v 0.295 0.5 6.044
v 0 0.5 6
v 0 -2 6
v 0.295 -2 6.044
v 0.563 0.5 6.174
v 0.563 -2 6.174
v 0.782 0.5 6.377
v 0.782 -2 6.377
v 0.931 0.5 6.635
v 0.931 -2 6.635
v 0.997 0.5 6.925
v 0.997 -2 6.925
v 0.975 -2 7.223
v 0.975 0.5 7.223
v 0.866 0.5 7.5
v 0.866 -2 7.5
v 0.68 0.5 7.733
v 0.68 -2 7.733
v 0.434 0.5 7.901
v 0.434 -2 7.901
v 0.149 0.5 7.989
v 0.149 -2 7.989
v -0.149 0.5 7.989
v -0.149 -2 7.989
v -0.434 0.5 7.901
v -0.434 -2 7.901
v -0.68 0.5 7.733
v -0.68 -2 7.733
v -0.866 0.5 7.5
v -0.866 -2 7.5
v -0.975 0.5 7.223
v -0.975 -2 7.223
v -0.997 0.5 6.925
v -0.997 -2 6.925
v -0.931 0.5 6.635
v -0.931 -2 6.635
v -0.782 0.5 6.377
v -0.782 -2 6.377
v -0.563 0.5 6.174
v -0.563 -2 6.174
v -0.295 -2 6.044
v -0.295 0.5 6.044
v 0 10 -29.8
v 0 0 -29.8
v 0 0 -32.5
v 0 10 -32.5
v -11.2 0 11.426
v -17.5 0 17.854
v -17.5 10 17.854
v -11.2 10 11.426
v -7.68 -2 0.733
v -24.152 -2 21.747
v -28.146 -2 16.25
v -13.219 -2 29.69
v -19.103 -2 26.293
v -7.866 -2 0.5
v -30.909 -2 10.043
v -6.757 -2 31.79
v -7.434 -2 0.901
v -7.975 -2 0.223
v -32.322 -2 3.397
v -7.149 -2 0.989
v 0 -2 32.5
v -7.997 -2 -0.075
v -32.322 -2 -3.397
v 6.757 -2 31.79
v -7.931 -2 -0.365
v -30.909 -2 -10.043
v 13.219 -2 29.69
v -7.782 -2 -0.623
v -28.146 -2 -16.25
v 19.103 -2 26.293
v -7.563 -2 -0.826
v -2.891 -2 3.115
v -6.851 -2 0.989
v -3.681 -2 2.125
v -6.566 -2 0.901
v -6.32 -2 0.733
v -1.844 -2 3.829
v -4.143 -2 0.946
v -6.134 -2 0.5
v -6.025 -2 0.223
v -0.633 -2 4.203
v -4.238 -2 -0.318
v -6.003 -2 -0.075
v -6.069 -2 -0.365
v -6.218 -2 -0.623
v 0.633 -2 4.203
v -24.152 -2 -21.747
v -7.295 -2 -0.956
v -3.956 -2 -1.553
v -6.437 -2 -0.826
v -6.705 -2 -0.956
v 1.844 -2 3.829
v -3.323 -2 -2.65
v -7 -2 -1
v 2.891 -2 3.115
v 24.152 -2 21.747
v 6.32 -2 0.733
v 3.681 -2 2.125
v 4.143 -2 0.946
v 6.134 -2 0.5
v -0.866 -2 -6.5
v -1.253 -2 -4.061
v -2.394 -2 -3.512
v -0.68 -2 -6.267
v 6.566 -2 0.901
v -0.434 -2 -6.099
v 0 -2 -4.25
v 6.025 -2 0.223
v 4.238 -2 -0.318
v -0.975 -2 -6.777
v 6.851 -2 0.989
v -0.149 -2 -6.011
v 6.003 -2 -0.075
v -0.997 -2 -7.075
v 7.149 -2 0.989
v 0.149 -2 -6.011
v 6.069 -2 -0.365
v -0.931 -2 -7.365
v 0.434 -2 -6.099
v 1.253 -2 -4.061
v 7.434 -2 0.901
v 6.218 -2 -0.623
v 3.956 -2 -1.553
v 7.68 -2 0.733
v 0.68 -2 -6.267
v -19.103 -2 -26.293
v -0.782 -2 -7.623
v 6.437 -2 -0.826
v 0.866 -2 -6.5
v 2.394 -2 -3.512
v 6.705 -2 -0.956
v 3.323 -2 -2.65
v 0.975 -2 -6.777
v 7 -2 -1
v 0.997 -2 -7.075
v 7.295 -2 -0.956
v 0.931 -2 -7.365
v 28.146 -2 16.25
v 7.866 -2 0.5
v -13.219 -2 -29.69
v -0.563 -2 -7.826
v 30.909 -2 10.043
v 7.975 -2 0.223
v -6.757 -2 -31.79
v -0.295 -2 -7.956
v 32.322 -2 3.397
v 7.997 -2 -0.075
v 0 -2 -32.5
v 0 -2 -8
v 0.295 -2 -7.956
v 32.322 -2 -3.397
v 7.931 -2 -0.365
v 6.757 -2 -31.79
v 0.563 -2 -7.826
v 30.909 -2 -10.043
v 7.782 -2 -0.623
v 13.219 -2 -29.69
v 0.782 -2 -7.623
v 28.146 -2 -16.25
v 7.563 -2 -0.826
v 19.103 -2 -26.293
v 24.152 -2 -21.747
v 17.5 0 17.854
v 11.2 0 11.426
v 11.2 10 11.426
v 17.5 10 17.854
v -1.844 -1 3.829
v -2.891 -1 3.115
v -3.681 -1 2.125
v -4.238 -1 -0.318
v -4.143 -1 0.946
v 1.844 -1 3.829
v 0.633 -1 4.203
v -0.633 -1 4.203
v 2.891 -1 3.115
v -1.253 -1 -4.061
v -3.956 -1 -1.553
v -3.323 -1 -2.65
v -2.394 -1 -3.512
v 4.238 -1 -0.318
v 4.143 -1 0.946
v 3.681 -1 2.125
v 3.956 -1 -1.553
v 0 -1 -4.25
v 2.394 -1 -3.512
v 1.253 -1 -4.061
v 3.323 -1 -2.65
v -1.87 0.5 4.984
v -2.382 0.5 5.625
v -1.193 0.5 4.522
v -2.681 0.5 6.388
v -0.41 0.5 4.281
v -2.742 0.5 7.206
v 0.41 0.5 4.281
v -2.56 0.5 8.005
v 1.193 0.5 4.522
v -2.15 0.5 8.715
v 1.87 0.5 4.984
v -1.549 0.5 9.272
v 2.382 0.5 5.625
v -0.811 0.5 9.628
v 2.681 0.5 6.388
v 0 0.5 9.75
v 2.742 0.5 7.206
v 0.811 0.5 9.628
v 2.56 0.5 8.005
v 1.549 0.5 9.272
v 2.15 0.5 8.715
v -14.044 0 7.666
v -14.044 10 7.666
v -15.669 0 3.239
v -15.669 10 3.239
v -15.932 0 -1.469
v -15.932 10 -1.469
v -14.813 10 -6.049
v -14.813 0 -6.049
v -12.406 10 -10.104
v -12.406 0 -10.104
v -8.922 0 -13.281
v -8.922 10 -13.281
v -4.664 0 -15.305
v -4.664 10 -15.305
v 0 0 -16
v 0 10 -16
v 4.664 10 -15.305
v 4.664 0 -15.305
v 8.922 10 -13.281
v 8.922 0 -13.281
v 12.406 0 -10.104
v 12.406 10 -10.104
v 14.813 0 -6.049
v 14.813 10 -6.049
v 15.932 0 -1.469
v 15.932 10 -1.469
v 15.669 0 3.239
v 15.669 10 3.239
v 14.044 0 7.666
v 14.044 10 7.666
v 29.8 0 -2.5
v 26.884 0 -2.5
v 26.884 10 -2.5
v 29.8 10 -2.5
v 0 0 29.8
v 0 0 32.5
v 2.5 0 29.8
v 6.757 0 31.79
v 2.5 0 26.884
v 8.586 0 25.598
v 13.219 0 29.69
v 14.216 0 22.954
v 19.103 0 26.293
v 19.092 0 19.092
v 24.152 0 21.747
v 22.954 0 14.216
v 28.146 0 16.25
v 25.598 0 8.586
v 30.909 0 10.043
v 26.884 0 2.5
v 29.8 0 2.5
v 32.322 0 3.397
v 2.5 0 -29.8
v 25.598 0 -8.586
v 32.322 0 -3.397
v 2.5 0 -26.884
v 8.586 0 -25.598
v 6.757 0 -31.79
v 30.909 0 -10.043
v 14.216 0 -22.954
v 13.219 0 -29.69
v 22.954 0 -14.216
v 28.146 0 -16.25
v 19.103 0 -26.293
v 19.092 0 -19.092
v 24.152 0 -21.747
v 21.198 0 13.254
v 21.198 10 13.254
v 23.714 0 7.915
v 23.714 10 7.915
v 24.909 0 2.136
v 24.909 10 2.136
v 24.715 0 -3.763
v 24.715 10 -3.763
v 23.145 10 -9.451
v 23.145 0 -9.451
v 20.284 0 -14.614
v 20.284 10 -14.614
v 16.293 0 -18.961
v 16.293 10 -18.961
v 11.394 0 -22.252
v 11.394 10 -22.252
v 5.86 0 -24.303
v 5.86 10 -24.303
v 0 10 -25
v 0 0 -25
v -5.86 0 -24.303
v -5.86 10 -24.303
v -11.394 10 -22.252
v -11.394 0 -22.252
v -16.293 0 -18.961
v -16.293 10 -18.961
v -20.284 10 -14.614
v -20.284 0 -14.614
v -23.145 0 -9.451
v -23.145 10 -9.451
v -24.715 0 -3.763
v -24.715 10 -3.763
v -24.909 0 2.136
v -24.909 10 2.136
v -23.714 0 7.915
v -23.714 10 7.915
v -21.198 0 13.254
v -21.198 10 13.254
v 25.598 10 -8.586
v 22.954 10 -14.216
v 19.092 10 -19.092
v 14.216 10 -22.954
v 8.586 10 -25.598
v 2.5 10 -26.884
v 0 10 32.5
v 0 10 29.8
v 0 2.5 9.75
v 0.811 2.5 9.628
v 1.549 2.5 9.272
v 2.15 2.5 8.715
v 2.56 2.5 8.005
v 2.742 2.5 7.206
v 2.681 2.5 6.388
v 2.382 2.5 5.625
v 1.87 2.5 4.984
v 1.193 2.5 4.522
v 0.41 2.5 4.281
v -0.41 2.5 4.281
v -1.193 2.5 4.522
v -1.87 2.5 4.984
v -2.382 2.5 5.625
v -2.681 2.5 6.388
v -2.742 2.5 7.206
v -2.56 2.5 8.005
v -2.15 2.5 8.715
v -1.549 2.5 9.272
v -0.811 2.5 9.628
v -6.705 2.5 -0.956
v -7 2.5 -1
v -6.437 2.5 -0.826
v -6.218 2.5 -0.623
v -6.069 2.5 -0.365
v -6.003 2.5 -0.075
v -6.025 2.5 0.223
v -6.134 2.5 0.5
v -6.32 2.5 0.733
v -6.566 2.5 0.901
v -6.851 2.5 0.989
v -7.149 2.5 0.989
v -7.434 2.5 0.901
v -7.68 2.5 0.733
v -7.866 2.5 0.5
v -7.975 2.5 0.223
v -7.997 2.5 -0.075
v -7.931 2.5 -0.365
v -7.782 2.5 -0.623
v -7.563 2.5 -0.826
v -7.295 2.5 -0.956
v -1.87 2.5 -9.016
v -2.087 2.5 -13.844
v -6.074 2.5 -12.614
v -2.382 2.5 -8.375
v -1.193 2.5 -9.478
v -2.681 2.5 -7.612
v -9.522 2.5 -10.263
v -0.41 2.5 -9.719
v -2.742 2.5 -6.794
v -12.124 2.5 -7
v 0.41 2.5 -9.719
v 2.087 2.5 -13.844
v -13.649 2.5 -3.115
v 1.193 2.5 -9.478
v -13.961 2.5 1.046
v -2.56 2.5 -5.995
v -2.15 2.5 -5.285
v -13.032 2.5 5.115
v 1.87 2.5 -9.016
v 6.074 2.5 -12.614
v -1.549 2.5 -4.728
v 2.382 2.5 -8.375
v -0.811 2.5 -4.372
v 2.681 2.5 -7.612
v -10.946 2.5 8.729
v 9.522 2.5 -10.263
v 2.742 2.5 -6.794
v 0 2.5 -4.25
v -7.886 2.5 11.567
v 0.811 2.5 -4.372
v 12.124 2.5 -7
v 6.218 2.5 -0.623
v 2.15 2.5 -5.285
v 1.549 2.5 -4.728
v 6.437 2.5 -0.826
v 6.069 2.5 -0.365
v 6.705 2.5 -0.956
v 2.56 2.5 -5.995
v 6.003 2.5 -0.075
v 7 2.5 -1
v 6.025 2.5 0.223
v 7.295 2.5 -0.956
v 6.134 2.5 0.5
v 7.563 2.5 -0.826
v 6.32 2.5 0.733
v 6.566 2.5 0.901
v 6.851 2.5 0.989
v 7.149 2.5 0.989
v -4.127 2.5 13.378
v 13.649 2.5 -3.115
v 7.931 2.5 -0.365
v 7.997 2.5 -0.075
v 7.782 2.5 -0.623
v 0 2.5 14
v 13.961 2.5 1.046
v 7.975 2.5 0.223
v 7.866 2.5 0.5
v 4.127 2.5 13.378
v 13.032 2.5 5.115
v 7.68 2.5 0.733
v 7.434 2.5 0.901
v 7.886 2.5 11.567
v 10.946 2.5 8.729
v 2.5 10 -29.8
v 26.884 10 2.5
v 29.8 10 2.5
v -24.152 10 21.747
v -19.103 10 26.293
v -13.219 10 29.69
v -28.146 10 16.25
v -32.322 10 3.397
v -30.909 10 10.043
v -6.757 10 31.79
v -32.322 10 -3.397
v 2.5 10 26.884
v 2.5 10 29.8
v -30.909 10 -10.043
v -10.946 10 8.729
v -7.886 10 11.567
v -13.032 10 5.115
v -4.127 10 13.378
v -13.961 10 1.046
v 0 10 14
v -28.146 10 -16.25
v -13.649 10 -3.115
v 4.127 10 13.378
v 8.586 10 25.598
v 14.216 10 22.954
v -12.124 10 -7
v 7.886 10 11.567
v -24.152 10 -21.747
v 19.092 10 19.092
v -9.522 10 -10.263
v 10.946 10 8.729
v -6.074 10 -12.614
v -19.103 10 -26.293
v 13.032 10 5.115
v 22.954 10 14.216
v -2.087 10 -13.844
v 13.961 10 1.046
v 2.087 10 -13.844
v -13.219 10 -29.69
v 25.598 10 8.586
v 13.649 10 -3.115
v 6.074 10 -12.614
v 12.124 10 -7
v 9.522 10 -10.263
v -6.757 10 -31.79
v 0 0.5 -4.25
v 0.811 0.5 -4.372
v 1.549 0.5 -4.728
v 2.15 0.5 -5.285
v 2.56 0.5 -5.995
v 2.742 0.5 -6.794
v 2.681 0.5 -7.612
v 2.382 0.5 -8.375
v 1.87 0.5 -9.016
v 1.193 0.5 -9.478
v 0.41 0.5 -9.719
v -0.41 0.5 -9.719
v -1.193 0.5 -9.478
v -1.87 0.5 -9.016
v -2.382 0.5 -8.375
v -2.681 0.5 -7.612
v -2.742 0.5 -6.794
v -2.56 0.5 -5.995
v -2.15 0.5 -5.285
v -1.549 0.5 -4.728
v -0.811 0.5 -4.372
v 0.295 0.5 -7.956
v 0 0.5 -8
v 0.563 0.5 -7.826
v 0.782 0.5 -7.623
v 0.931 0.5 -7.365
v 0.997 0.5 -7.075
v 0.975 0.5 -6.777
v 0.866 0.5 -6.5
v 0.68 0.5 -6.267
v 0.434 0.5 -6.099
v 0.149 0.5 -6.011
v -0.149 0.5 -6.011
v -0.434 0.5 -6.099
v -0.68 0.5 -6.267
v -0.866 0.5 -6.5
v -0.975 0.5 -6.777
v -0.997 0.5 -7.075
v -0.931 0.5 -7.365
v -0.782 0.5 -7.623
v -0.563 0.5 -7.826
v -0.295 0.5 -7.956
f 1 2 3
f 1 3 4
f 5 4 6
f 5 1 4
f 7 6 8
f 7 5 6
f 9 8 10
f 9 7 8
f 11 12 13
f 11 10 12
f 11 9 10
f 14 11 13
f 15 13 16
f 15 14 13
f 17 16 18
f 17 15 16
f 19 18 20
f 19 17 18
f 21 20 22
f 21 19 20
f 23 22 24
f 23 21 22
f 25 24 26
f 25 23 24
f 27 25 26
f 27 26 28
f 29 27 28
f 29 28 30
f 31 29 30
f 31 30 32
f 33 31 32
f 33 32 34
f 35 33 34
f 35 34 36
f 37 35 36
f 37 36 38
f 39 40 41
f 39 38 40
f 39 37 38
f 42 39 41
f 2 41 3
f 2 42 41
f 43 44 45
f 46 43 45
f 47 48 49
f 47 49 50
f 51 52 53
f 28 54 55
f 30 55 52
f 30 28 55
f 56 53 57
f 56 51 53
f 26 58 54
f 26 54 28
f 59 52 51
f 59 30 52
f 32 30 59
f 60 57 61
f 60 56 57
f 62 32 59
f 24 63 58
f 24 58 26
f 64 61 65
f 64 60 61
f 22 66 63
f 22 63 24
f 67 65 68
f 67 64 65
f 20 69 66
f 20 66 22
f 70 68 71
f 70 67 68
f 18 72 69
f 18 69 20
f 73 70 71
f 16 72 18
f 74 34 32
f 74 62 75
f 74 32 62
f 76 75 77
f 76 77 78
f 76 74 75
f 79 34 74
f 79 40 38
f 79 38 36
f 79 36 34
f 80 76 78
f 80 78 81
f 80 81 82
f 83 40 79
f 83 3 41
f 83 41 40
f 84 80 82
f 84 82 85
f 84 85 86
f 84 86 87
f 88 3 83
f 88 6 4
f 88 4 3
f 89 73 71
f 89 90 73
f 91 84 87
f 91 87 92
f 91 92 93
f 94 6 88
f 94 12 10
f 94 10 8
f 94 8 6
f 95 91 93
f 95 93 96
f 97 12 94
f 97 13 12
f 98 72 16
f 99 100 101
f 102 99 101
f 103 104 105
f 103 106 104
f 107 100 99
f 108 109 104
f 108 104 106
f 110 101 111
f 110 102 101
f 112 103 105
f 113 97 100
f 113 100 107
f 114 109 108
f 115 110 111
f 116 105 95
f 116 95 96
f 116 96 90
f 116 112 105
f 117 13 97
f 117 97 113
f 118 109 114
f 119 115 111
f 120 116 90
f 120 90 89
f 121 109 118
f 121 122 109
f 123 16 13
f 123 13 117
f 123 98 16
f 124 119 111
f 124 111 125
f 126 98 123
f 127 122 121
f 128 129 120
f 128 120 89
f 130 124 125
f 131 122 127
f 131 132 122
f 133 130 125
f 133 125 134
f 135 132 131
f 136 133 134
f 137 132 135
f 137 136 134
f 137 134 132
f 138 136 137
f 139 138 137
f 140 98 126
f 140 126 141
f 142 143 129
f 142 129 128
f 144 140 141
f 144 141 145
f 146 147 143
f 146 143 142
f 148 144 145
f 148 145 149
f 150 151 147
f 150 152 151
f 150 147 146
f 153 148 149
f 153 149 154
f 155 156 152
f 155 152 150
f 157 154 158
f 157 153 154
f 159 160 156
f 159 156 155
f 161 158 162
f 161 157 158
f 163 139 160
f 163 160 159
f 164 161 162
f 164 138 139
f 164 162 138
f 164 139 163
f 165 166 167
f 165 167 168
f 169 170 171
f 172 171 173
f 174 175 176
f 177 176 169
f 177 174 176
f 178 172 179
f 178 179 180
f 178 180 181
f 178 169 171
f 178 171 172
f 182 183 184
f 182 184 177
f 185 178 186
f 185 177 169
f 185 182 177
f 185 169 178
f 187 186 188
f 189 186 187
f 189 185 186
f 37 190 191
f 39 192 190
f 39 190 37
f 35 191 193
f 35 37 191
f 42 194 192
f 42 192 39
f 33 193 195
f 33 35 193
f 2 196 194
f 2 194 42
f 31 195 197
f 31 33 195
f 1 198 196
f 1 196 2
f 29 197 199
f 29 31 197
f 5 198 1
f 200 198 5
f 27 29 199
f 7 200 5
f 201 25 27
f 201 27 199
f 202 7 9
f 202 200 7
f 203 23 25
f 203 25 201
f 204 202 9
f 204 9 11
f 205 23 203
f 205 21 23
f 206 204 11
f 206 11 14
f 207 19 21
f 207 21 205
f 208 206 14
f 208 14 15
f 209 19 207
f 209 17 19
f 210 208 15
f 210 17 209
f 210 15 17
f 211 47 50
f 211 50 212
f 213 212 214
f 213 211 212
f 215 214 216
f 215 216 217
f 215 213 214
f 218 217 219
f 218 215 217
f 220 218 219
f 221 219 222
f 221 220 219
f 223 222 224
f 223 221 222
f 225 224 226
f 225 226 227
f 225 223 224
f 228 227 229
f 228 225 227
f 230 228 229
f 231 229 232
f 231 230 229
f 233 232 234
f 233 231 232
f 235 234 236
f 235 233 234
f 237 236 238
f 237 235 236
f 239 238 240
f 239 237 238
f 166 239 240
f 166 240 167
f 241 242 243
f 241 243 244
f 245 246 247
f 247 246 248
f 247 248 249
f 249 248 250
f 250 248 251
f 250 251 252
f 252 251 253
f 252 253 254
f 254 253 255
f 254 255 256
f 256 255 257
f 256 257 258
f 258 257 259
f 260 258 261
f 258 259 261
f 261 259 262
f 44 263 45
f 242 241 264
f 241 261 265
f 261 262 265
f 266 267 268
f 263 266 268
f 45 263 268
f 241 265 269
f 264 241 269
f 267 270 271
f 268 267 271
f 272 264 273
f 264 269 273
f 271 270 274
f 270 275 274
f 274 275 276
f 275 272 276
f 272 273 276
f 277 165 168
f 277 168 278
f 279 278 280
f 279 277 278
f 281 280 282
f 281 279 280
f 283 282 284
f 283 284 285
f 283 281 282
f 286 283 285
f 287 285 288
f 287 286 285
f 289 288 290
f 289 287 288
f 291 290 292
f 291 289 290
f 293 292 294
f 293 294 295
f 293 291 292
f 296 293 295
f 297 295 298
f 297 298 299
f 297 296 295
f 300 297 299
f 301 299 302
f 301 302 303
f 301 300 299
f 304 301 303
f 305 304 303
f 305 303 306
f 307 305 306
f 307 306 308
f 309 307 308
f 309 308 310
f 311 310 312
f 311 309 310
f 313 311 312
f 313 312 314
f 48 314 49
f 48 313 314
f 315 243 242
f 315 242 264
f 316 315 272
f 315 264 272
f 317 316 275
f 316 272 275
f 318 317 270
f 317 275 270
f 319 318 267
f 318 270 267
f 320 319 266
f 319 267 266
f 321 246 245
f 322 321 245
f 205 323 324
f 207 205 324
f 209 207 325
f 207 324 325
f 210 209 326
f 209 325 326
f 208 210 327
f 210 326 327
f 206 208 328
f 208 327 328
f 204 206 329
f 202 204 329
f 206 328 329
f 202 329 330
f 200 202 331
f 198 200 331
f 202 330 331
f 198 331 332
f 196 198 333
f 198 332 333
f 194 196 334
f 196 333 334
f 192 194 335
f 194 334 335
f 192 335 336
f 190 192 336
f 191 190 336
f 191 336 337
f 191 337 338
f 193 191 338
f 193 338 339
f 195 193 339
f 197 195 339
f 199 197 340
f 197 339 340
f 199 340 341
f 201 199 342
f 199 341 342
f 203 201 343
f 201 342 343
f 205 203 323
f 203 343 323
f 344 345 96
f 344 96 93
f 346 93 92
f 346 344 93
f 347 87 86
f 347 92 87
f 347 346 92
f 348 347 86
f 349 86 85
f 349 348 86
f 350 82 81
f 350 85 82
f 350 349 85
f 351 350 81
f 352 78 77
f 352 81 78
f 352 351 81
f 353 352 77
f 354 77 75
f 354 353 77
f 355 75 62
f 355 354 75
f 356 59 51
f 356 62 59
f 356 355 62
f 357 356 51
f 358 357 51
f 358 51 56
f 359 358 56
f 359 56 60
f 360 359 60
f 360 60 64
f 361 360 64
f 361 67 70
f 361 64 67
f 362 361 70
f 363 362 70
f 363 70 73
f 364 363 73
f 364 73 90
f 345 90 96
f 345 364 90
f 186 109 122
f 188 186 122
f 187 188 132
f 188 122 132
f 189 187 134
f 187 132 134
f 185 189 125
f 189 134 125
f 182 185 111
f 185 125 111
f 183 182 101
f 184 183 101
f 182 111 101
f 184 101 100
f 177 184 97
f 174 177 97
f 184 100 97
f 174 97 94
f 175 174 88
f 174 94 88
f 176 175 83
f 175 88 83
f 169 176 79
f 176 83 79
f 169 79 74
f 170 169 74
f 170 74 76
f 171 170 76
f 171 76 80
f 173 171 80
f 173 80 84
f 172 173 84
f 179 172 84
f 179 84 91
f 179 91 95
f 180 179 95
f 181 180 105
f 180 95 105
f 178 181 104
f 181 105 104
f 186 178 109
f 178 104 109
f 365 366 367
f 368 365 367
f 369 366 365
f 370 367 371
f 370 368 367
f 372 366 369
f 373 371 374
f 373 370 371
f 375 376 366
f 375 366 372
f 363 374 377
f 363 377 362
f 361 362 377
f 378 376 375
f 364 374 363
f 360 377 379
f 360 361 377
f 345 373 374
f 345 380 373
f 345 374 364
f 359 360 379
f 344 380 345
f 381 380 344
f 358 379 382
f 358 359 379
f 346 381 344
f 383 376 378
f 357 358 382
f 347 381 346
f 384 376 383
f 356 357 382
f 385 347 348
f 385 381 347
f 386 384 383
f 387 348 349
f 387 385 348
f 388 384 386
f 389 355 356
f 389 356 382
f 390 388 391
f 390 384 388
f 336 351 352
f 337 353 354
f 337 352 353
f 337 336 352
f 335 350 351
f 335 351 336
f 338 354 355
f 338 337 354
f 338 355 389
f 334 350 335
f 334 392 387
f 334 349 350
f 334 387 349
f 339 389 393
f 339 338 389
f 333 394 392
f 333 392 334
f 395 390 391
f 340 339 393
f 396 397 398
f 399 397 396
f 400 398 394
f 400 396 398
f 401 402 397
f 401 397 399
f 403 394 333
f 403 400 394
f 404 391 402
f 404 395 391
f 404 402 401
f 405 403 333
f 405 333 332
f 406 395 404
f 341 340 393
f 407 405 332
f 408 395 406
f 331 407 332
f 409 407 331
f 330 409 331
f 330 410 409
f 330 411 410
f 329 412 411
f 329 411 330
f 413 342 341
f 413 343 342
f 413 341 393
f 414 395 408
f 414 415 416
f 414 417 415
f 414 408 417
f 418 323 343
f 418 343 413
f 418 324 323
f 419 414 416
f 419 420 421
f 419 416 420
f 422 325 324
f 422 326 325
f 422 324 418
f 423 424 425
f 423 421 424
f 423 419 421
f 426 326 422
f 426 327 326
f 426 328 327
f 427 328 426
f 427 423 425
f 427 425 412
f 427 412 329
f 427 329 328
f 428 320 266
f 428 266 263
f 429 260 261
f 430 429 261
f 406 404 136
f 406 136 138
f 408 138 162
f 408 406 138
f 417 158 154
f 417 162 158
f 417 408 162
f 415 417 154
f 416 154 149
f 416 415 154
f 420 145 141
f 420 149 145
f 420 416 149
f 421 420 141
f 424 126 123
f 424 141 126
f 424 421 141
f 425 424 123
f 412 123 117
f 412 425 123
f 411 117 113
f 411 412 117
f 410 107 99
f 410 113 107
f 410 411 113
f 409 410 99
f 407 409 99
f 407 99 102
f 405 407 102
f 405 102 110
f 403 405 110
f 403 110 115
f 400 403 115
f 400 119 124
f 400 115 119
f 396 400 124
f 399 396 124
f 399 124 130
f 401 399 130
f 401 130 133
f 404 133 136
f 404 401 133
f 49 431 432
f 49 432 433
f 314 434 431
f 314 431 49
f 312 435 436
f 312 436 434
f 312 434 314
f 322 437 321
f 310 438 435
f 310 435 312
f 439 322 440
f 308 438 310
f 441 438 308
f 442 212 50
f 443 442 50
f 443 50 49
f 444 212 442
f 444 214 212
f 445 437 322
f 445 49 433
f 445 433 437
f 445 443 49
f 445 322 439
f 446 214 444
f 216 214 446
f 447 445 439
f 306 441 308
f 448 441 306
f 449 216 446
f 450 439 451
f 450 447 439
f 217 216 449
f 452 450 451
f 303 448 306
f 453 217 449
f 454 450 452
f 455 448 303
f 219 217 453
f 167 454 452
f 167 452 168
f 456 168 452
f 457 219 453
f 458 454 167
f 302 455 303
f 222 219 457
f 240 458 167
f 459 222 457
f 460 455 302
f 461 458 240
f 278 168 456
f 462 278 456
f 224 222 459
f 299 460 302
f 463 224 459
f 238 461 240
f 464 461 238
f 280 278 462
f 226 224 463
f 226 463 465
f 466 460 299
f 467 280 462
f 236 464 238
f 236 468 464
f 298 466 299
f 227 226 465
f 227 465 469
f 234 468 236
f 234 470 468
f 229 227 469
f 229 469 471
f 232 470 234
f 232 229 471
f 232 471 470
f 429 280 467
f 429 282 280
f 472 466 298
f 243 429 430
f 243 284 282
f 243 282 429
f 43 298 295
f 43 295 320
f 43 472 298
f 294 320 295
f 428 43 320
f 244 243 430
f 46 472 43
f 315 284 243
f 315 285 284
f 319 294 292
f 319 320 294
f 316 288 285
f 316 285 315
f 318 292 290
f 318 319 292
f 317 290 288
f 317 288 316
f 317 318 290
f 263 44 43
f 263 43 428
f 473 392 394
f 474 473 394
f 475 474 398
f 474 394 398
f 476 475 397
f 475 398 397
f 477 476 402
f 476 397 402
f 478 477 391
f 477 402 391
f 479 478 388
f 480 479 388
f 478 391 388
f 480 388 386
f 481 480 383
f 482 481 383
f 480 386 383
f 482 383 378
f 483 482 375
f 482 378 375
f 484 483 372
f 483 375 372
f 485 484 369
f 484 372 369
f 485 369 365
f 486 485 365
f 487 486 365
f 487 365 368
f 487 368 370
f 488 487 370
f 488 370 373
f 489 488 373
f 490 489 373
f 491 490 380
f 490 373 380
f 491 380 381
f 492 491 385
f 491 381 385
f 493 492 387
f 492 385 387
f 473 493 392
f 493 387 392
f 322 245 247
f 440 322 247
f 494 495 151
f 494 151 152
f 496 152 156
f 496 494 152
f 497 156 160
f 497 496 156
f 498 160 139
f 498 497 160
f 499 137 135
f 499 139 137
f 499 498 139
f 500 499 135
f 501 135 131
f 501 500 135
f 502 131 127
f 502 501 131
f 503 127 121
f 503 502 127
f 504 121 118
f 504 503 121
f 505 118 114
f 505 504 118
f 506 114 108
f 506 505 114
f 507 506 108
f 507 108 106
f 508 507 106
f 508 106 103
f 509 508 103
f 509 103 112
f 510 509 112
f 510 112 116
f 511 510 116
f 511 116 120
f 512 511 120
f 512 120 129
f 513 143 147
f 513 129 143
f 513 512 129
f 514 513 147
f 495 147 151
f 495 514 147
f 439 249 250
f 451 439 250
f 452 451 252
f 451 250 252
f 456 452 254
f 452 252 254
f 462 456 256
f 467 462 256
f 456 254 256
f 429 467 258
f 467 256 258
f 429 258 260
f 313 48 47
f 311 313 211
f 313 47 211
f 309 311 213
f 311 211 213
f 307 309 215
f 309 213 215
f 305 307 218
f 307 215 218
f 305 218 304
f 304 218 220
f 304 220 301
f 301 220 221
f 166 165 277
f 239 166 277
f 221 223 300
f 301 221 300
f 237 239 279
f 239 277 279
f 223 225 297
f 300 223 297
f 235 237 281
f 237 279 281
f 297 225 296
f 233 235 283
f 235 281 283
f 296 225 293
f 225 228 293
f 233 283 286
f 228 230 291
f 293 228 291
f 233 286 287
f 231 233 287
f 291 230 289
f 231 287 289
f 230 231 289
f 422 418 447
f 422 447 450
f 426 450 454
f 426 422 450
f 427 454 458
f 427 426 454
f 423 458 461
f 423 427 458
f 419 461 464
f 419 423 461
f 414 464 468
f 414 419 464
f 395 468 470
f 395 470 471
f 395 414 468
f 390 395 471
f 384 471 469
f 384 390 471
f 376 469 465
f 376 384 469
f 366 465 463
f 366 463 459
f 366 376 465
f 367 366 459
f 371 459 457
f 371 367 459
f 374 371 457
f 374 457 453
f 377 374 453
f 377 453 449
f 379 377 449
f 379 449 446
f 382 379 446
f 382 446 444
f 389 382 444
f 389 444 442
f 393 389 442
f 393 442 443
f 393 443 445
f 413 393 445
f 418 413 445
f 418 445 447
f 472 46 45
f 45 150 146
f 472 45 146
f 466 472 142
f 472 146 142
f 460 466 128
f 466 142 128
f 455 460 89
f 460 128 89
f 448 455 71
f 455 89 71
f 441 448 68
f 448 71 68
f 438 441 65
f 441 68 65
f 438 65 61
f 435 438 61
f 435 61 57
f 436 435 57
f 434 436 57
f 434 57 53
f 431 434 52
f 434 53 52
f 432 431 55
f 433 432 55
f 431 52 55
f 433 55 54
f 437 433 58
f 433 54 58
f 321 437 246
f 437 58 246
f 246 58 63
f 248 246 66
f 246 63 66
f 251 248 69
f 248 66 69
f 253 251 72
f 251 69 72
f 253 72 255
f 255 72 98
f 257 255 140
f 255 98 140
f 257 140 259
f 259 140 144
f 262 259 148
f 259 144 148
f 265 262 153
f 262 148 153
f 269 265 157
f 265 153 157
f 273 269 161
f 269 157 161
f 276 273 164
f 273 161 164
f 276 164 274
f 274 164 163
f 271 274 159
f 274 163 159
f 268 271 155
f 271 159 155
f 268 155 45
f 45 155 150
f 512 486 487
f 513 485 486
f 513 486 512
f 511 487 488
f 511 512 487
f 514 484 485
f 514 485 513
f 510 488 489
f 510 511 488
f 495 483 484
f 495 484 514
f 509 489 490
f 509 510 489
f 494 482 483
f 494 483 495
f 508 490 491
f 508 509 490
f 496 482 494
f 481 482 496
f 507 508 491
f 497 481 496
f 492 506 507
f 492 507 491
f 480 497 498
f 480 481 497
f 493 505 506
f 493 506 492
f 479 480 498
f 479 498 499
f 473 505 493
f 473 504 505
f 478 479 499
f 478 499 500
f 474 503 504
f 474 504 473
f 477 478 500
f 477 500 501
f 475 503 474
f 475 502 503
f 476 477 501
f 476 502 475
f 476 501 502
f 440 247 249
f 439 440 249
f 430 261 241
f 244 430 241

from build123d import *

# Parameters (mm, degrees)
SKETCH1_R               = 27
SKETCH1_R_2             = 14
BOSS_EXTRUDE1_DEPTH     = 10
SKETCH2_R               = 32.5
BOSS_EXTRUDE2_DEPTH     = 2
SKETCH3_W               = 5
SKETCH3_H               = 4.39677325
SKETCH3_W_2             = 4.39677325
SKETCH3_H_2             = 5
BOSS_EXTRUDE3_DEPTH     = 10
BOSS_EXTRUDE4_DEPTH     = 10
BOSS_EXTRUDE5_START     = -2.5
SKETCH6_R               = 14
BOSS_EXTRUDE5_DEPTH     = 2.5
CUT_EXTRUDE1_DEPTH      = 48.502631506
CUT_EXTRUDE1_DEPTH_BACK = 48.502631506
SKETCH4_R               = 1
SKETCH10_R              = 2.75
CUT_EXTRUDE4_DEPTH      = 2
SKETCH11_R              = 4.25
CUT_EXTRUDE5_DEPTH      = 1


with BuildPart() as part:
    # Sketch1 → Boss-Extrude1 (new body)
    with BuildSketch(Plane(origin=(0, 0, 0), x_dir=(1, 0, 0), z_dir=(0, 1, 0))):
        with Locations(Location((0, 0, 0), (0, 0, 270))):
            Circle(SKETCH1_R)
        with Locations(Location((0, 0, 0), (0, 0, 270))):
            Circle(SKETCH1_R_2, mode=Mode.SUBTRACT)
        with BuildLine():
            Line((-17.5, -17.853571071), (-11.2, -11.426285486))
            ThreePointArc((-11.2, -11.426285486), (0, 16), (11.2, -11.426285486))
            Line((11.2, -11.426285486), (17.5, -17.853571071))
            ThreePointArc((17.5, -17.853571071), (0, 25), (-17.5, -17.853571071))
        make_face(mode=Mode.SUBTRACT)
    extrude(amount=BOSS_EXTRUDE1_DEPTH)

    # Sketch2 → Boss-Extrude2 (add)
    with BuildSketch(Plane.XZ):
        with Locations(Location((0, 0, 0), (0, 0, 270))):
            Circle(SKETCH2_R)
    extrude(amount=BOSS_EXTRUDE2_DEPTH)

    # Sketch3 → Boss-Extrude3 (add)
    with BuildSketch(Plane(origin=(0, 0, 0), x_dir=(1, 0, 0), z_dir=(0, 1, 0))):
        with Locations((0, 27.601613375)):
            Rectangle(SKETCH3_W, SKETCH3_H)
        with Locations((27.601613375, 0)):
            Rectangle(SKETCH3_W_2, SKETCH3_H_2)
        with Locations((0, -27.601613375)):
            Rectangle(SKETCH3_W, SKETCH3_H)
        with Locations((-27.601613375, 0)):
            Rectangle(SKETCH3_W_2, SKETCH3_H_2)
    extrude(amount=BOSS_EXTRUDE3_DEPTH)

    # Sketch5 → Boss-Extrude4 (add)
    with BuildSketch(Plane(origin=(0, 0, 0), x_dir=(1, 0, 0), z_dir=(0, 1, 0))):
        with BuildLine():
            Line((0, 29.8), (0, 32.5))
            ThreePointArc((0, 32.5), (-32.5, 0), (0, -32.5))
            Line((0, -32.5), (0, -29.8))
            Line((0, -29.8), (-2.5, -29.8))
            Line((-2.5, -29.8), (-2.5, -26.884010118))
            ThreePointArc((-2.5, -26.884010118), (-19.091883092, -19.091883092), (-26.884010118, -2.5))
            Line((-26.884010118, -2.5), (-29.8, -2.5))
            Line((-29.8, -2.5), (-29.8, 2.5))
            Line((-29.8, 2.5), (-26.884010118, 2.5))
            ThreePointArc((-26.884010118, 2.5), (-19.091883092, 19.091883092), (-2.5, 26.884010118))
            Line((-2.5, 26.884010118), (-2.5, 29.8))
            Line((-2.5, 29.8), (0, 29.8))
        make_face()
    extrude(amount=BOSS_EXTRUDE4_DEPTH)

    # Sketch6 → Boss-Extrude5 (add)
    with BuildSketch(Plane(origin=(0, 2.5, 0), x_dir=(1, 0, 0), z_dir=(0, 1, 0)).offset(BOSS_EXTRUDE5_START)):
        with Locations(Location((0, 0, 0), (0, 0, 270))):
            Circle(SKETCH6_R)
    extrude(amount=BOSS_EXTRUDE5_DEPTH)

    # Sketch4 → Cut-Extrude1 (cut, two sides: drawn at the far end of the back side and taken through both)
    with BuildSketch(Plane.XZ.offset(2).offset(-CUT_EXTRUDE1_DEPTH_BACK)):
        with Locations(Location((0, -7, 0), (0, 0, 270))):
            Circle(SKETCH4_R)
        with Locations(Location((-7, 0, 0), (0, 0, 270))):
            Circle(SKETCH4_R)
        with Locations(Location((0, 7, 0), (0, 0, 270))):
            Circle(SKETCH4_R)
        with Locations(Location((7, 0, 0), (0, 0, 270))):
            Circle(SKETCH4_R)
    extrude(amount=CUT_EXTRUDE1_DEPTH + CUT_EXTRUDE1_DEPTH_BACK, mode=Mode.SUBTRACT)

    # Sketch10 → Cut-Extrude4 (cut)
    with BuildSketch(Plane(origin=(0, 2.5, 0), x_dir=(1, 0, 0), z_dir=(0, 1, 0))):
        with Locations(Location((0, 7, 0), (0, 0, 270))):
            Circle(SKETCH10_R)
        with Locations(Location((0, -7, 0), (0, 0, 270))):
            Circle(SKETCH10_R)
    extrude(amount=-CUT_EXTRUDE4_DEPTH, mode=Mode.SUBTRACT)

    # Sketch11 → Cut-Extrude5 (cut)
    with BuildSketch(Plane.XZ.offset(2)):
        with Locations(Location((0, 0, 0), (0, 0, 270))):
            Circle(SKETCH11_R)
    extrude(amount=-CUT_EXTRUDE5_DEPTH, mode=Mode.SUBTRACT)


solid = part.part
